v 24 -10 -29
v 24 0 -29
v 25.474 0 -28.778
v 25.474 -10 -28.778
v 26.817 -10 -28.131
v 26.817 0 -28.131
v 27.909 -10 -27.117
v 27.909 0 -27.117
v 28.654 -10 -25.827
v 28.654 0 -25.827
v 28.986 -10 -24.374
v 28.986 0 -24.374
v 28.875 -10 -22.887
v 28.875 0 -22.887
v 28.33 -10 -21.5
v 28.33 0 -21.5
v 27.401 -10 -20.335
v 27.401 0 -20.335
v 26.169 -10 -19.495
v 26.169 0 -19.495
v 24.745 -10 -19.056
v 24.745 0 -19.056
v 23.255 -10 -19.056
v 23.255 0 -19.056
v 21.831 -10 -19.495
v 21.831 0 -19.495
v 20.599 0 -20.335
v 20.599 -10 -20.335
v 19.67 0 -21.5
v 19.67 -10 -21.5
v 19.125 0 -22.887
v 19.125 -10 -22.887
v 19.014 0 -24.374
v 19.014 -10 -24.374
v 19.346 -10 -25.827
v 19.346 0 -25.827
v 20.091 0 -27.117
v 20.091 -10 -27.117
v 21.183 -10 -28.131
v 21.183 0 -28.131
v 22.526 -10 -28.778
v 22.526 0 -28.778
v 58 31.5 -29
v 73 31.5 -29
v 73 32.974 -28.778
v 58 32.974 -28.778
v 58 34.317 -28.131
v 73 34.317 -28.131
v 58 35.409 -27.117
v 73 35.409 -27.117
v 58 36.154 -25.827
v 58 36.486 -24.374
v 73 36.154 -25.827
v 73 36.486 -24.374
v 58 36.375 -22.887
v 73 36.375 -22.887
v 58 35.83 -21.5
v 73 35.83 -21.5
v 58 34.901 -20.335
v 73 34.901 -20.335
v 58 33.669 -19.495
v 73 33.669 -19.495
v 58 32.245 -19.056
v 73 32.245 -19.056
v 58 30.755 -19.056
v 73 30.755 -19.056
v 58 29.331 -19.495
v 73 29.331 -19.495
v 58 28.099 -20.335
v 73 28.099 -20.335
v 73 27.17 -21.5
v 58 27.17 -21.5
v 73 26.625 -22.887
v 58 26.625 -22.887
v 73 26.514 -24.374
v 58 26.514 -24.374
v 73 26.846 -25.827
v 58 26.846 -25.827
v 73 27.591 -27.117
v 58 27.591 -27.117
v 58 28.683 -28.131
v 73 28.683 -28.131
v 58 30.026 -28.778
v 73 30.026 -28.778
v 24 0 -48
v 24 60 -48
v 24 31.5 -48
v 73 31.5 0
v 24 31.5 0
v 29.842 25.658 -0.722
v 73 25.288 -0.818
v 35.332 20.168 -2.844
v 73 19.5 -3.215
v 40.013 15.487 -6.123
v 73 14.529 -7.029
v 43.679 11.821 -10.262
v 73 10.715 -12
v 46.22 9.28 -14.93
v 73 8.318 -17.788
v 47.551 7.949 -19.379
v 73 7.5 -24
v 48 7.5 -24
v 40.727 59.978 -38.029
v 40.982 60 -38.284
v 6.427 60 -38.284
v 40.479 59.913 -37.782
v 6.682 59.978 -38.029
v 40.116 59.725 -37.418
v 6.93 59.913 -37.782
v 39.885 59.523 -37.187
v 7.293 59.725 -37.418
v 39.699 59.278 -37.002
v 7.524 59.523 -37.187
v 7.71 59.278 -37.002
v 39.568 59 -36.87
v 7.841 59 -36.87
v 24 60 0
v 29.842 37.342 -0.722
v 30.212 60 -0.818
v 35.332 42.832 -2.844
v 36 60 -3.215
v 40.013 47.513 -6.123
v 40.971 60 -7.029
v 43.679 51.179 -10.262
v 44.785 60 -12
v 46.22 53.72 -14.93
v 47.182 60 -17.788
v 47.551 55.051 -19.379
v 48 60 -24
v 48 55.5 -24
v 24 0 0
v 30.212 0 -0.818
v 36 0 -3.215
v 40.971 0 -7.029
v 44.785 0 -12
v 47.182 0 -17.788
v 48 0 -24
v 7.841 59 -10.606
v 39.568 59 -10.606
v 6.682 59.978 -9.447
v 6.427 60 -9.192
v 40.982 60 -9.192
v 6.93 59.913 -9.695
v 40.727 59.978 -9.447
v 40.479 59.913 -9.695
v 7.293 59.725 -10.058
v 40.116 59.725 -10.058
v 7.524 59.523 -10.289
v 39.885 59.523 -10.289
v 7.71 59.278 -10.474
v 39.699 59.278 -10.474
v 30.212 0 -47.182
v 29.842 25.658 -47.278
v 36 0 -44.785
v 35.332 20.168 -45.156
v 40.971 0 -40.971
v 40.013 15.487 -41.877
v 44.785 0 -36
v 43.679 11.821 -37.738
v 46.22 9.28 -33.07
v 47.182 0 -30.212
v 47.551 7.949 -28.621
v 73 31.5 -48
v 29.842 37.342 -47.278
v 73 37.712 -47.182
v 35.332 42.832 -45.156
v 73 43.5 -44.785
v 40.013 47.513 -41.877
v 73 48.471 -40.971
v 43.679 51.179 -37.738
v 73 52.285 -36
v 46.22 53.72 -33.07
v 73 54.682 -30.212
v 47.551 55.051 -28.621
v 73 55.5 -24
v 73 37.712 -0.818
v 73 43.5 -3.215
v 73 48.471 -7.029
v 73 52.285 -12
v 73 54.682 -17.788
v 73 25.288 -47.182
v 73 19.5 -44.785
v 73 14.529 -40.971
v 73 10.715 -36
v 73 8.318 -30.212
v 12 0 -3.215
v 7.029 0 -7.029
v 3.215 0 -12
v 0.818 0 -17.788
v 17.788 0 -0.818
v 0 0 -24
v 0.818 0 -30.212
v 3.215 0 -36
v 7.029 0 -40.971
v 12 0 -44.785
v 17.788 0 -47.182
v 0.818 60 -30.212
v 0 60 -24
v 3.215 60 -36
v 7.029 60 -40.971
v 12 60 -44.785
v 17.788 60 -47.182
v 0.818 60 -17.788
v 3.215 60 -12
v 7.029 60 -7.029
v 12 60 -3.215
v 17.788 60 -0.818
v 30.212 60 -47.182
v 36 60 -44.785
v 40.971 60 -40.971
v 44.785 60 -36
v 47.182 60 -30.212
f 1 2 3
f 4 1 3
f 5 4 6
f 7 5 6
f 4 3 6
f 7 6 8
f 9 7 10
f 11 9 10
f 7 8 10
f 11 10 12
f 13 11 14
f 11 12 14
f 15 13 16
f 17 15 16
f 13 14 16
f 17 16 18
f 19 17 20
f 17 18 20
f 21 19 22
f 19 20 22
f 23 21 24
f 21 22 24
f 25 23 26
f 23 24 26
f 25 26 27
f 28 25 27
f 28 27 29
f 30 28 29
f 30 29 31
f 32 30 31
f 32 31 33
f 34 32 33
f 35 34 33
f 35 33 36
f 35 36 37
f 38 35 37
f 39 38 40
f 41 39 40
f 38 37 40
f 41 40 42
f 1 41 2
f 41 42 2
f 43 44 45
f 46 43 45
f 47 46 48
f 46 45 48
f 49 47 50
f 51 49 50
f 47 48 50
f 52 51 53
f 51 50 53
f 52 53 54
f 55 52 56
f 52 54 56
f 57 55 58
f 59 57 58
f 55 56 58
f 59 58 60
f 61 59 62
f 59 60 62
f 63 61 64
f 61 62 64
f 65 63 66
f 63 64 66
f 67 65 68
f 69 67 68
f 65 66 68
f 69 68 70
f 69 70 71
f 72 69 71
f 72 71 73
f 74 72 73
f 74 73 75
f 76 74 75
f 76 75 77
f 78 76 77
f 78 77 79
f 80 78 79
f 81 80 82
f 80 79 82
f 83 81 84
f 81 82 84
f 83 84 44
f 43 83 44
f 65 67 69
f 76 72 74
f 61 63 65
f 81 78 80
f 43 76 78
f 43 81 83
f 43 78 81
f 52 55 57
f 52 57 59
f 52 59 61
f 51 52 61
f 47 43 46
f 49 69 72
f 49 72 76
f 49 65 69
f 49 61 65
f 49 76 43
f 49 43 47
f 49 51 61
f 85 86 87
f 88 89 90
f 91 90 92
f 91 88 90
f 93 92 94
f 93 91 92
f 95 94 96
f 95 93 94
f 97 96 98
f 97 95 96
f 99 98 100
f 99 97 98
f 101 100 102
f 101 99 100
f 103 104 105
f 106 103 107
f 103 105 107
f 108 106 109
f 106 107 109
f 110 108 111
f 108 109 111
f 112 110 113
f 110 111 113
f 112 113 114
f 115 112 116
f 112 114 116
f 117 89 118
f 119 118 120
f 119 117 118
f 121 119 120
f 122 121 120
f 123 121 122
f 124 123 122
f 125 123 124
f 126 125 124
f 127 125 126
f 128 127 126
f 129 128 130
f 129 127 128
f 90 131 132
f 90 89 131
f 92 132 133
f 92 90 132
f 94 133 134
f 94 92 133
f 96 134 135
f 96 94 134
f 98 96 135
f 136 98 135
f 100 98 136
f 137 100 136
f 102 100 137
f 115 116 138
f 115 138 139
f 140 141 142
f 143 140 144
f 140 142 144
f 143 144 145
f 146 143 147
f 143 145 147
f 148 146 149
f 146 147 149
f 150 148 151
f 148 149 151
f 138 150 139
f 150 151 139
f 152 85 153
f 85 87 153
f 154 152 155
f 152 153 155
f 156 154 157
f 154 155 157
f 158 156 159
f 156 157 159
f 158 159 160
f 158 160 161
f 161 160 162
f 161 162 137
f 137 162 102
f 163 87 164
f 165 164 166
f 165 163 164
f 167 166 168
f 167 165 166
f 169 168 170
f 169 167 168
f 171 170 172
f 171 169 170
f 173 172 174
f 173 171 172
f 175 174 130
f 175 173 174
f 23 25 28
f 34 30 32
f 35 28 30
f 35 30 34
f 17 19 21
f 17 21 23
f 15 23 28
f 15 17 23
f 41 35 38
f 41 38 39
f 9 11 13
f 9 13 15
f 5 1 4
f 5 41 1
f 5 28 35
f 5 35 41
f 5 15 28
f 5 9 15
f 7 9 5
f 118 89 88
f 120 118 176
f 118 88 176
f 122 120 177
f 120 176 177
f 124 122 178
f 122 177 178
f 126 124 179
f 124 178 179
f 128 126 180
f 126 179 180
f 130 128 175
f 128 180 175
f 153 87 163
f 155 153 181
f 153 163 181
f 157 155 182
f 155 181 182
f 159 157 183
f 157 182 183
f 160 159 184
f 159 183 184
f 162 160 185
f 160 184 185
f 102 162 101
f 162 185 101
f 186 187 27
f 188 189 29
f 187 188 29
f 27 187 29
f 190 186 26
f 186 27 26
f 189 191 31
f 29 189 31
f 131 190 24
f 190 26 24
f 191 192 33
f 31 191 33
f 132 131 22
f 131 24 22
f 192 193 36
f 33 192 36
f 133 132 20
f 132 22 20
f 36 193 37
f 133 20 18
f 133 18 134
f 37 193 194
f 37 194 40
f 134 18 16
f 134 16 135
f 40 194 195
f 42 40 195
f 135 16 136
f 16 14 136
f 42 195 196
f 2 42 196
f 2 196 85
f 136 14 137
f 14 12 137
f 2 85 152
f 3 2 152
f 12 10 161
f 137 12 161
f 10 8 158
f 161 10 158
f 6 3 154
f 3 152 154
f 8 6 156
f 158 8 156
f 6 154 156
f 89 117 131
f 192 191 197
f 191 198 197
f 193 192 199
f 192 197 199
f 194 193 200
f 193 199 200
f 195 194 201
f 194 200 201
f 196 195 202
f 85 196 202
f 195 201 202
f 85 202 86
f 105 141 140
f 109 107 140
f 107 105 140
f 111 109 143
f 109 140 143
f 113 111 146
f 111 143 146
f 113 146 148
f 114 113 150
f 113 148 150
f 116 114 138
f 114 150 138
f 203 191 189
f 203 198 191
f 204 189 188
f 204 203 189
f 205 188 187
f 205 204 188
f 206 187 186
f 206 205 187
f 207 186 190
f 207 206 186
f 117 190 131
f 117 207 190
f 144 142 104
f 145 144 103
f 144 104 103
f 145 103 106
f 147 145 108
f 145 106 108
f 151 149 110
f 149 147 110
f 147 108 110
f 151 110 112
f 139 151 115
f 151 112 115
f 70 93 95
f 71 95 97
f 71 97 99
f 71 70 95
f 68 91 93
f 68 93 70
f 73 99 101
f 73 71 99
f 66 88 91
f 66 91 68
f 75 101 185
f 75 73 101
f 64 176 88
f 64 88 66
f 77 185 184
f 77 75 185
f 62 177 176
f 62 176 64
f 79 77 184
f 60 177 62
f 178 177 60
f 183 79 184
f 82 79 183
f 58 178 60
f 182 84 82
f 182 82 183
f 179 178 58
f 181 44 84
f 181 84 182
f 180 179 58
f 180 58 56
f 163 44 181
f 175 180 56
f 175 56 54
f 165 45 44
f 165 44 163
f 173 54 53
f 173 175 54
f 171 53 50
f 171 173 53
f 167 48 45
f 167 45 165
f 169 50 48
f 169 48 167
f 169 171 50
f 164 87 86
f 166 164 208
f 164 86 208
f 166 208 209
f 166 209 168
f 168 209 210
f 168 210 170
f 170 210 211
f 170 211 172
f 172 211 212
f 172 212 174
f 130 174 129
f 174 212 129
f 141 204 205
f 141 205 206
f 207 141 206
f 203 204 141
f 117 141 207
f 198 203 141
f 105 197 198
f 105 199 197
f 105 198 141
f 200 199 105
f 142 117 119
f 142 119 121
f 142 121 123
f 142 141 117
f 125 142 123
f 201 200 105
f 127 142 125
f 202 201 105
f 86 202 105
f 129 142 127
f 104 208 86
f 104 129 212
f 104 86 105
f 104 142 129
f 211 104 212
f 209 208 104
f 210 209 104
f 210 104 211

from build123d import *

# Parameters (mm, degrees)
SKETCH1_W           = 48
SKETCH1_H           = 48
BOSS_EXTRUDE1_DEPTH = 60
SKETCH2_W           = 48
SKETCH2_H           = 48
BOSS_EXTRUDE2_DEPTH = 25
FILLET1_R           = 24
SKETCH3_R           = 5
BOSS_EXTRUDE3_DEPTH = 10
SKETCH4_R           = 5
CUT_EXTRUDE1_DEPTH  = 15
SKETCH5_W           = 31.72674495
SKETCH5_H           = 26.264357258
CUT_EXTRUDE2_DEPTH  = 2
SKETCH8_W           = 31.72674495
SKETCH8_H           = 26.264357258
BOSS_EXTRUDE6_DEPTH = 1
FILLET3_R           = 1.5


# Some blends are built 0.0001 mm under size
with BuildPart() as part:
    # Sketch1 → Boss-Extrude1 (new body)
    with BuildSketch(Plane(origin=(0, 0, 0), x_dir=(1, 0, 0), z_dir=(0, 1, 0))):
        with Locations((24, 24)):
            Rectangle(SKETCH1_W, SKETCH1_H)
    extrude(amount=BOSS_EXTRUDE1_DEPTH)

    # Sketch2 → Boss-Extrude2 (add)
    with BuildSketch(Plane(origin=(48, 0, 0), x_dir=(0, 0, -1), z_dir=(1, 0, 0))):
        with Locations((24, 31.5)):
            Rectangle(SKETCH2_W, SKETCH2_H)
    extrude(amount=BOSS_EXTRUDE2_DEPTH)

    # Fillet1
    fillet1_edges = [part.edges().sort_by_distance(p)[0] for p in [
        (0, 30, 0),
        (0, 30, -48),
        (48, 57.75, -48),
        (48, 57.75, 0),
        (48, 3.75, -48),
        (48, 3.75, 0),
        (60.5, 7.5, 0),
        (60.5, 55.5, 0),
        (60.5, 7.5, -48),
        (60.5, 55.5, -48),
    ]]
    fillet(fillet1_edges, radius=FILLET1_R - 0.0001)  # a hair under: the kernel refuses the full size

    # Sketch3 → Boss-Extrude3 (add)
    with BuildSketch(Plane(origin=(0, 0, 0), x_dir=(-1, 0, 0), z_dir=(0, -1, 0))):
        with Locations(Location((-24, 24, 0), (0, 0, 90))):
            Circle(SKETCH3_R)
    extrude(amount=BOSS_EXTRUDE3_DEPTH)

    # Sketch4 → Cut-Extrude1 (cut)
    with BuildSketch(Plane(origin=(73, 0, 0), x_dir=(0, 0, -1), z_dir=(1, 0, 0))):
        with Locations((24, 31.5)):
            Circle(SKETCH4_R)
    extrude(amount=-CUT_EXTRUDE1_DEPTH, mode=Mode.SUBTRACT)

    # Sketch5 → Cut-Extrude2 (cut)
    with BuildSketch(Plane(origin=(0, 60, 0), x_dir=(1, 0, 0), z_dir=(0, 1, 0))):
        with Locations((23.7045439, 23.7381047)):
            Rectangle(SKETCH5_W, SKETCH5_H)
    extrude(amount=-CUT_EXTRUDE2_DEPTH, mode=Mode.SUBTRACT)

    # Sketch8 → Boss-Extrude6 (add)
    with BuildSketch(Plane(origin=(0, 58, 0), x_dir=(1, 0, 0), z_dir=(0, 1, 0))):
        with Locations((23.7045439, 23.7381047)):
            Rectangle(SKETCH8_W, SKETCH8_H)
    extrude(amount=BOSS_EXTRUDE6_DEPTH)

    # Fillet3
    # the kernel refuses this fillet: 1.5 mm, written as the material it takes off along each edge
    with BuildSketch(Plane(origin=(39.567916375, 60, -10.605926071), x_dir=(0, 0, 1), z_dir=(-1, 0, 0)), Plane(origin=(7.841171425, 60, -36.870283329), x_dir=(0, 0, -1), z_dir=(1, 0, 0))) as fillet3_piece_1:
        with BuildLine():
            CenterArc((1.414213562, -1.5), FILLET3_R, 90, 70.528779366)
            Line((0, -1), (-0.028284271, -0.99))
            ThreePointArc((-0.028284271, -0.99), (-0.03, -0.5), (-0.03, 0))
            Line((-0.03, 0), (0, 0.03))
            Line((0, 0.03), (1.414213562, 0.03))
            Line((1.414213562, 0.03), (1.414213562, 0))
        make_face()
    extrude(amount=31.72674495, mode=Mode.SUBTRACT)
    with BuildSketch(Plane(origin=(39.567916375, 60, -36.870283329), x_dir=(1, 0, 0), z_dir=(0, 0, 1)), Plane(origin=(7.841171425, 60, -10.605926071), x_dir=(-1, 0, 0), z_dir=(0, 0, -1))) as fillet3_piece_2:
        with BuildLine():
            CenterArc((1.414213562, -1.5), FILLET3_R, 90, 70.528779366)
            Line((0, -1), (-0.028284271, -0.99))
            ThreePointArc((-0.028284271, -0.99), (-0.03, -0.5), (-0.03, 0))
            Line((-0.03, 0), (0, 0.03))
            Line((0, 0.03), (1.414213562, 0.03))
            Line((1.414213562, 0.03), (1.414213562, 0))
        make_face()
    extrude(amount=26.264357258, mode=Mode.SUBTRACT)
    with BuildSketch(Plane(origin=(43.103450281, 60, -10.605926071), x_dir=(0, 0, 1), z_dir=(-1, 0, 0))) as fillet3_piece_3a_section:
        with BuildLine():
            CenterArc((1.414213562, -1.5), FILLET3_R, 90, 70.528779366)
            Line((0, -1), (-0.028284271, -0.99))
            ThreePointArc((-0.028284271, -0.99), (-0.03, -0.5), (-0.03, 0))
            Line((-0.03, 0), (0, 0.03))
            Line((0, 0.03), (1.414213562, 0.03))
            Line((1.414213562, 0.03), (1.414213562, 0))
        make_face()
    fillet3_piece_3a = extrude(amount=35.262278856, mode=Mode.PRIVATE)
    fillet3_piece_3a = split(fillet3_piece_3a, bisect_by=Plane(origin=(39.567916375, 59.743234105, -10.266766855), z_dir=(1, 0, 0)), keep=Keep.TOP, mode=Mode.PRIVATE)
    with BuildSketch(Plane(origin=(39.567916375, 60, -36.870283329), x_dir=(1, 0, 0), z_dir=(0, 0, 1))) as fillet3_piece_3b_section:
        with BuildLine():
            CenterArc((1.414213562, -1.5), FILLET3_R, 90, 70.528779366)
            Line((0, -1), (-0.028284271, -0.99))
            ThreePointArc((-0.028284271, -0.99), (-0.03, -0.5), (-0.03, 0))
            Line((-0.03, 0), (0, 0.03))
            Line((0, 0.03), (1.414213562, 0.03))
            Line((1.414213562, 0.03), (1.414213562, 0))
        make_face()
    fillet3_piece_3b = extrude(amount=29.799891164, mode=Mode.PRIVATE)
    fillet3_piece_3b = split(fillet3_piece_3b, bisect_by=Plane(origin=(39.90707559, 59.743234105, -10.605926071), z_dir=(0, 0, 1)), keep=Keep.TOP, mode=Mode.PRIVATE)
    fillet3_piece_3 = fillet3_piece_3a & fillet3_piece_3b
    add(fillet3_piece_3, mode=Mode.SUBTRACT)
    with BuildSketch(Plane(origin=(7.841171425, 60, -7.070392165), x_dir=(-1, 0, 0), z_dir=(0, 0, -1))) as fillet3_piece_4a_section:
        with BuildLine():
            CenterArc((1.414213562, -1.5), FILLET3_R, 90, 70.528779366)
            Line((0, -1), (-0.028284271, -0.99))
            ThreePointArc((-0.028284271, -0.99), (-0.03, -0.5), (-0.03, 0))
            Line((-0.03, 0), (0, 0.03))
            Line((0, 0.03), (1.414213562, 0.03))
            Line((1.414213562, 0.03), (1.414213562, 0))
        make_face()
    fillet3_piece_4a = extrude(amount=29.799891164, mode=Mode.PRIVATE)
    fillet3_piece_4a = split(fillet3_piece_4a, bisect_by=Plane(origin=(7.50201221, 59.743234105, -10.605926071), z_dir=(0, 0, 1)), keep=Keep.TOP, mode=Mode.PRIVATE)
    with BuildSketch(Plane(origin=(39.567916375, 60, -10.605926071), x_dir=(0, 0, 1), z_dir=(-1, 0, 0))) as fillet3_piece_4b_section:
        with BuildLine():
            CenterArc((1.414213562, -1.5), FILLET3_R, 90, 70.528779366)
            Line((0, -1), (-0.028284271, -0.99))
            ThreePointArc((-0.028284271, -0.99), (-0.03, -0.5), (-0.03, 0))
            Line((-0.03, 0), (0, 0.03))
            Line((0, 0.03), (1.414213562, 0.03))
            Line((1.414213562, 0.03), (1.414213562, 0))
        make_face()
    fillet3_piece_4b = extrude(amount=35.262278856, mode=Mode.PRIVATE)
    fillet3_piece_4b = split(fillet3_piece_4b, bisect_by=Plane(origin=(7.841171425, 59.743234105, -10.266766855), z_dir=(-1, 0, 0)), keep=Keep.TOP, mode=Mode.PRIVATE)
    fillet3_piece_4 = fillet3_piece_4a & fillet3_piece_4b
    add(fillet3_piece_4, mode=Mode.SUBTRACT)
    with BuildSketch(Plane(origin=(39.567916375, 60, -40.405817235), x_dir=(1, 0, 0), z_dir=(0, 0, 1))) as fillet3_piece_5a_section:
        with BuildLine():
            CenterArc((1.414213562, -1.5), FILLET3_R, 90, 70.528779366)
            Line((0, -1), (-0.028284271, -0.99))
            ThreePointArc((-0.028284271, -0.99), (-0.03, -0.5), (-0.03, 0))
            Line((-0.03, 0), (0, 0.03))
            Line((0, 0.03), (1.414213562, 0.03))
            Line((1.414213562, 0.03), (1.414213562, 0))
        make_face()
    fillet3_piece_5a = extrude(amount=29.799891164, mode=Mode.PRIVATE)
    fillet3_piece_5a = split(fillet3_piece_5a, bisect_by=Plane(origin=(39.90707559, 59.743234105, -36.870283329), z_dir=(0, 0, -1)), keep=Keep.TOP, mode=Mode.PRIVATE)
    with BuildSketch(Plane(origin=(7.841171425, 60, -36.870283329), x_dir=(0, 0, -1), z_dir=(1, 0, 0))) as fillet3_piece_5b_section:
        with BuildLine():
            CenterArc((1.414213562, -1.5), FILLET3_R, 90, 70.528779366)
            Line((0, -1), (-0.028284271, -0.99))
            ThreePointArc((-0.028284271, -0.99), (-0.03, -0.5), (-0.03, 0))
            Line((-0.03, 0), (0, 0.03))
            Line((0, 0.03), (1.414213562, 0.03))
            Line((1.414213562, 0.03), (1.414213562, 0))
        make_face()
    fillet3_piece_5b = extrude(amount=35.262278856, mode=Mode.PRIVATE)
    fillet3_piece_5b = split(fillet3_piece_5b, bisect_by=Plane(origin=(39.567916375, 59.743234105, -37.209442544), z_dir=(1, 0, 0)), keep=Keep.TOP, mode=Mode.PRIVATE)
    fillet3_piece_5 = fillet3_piece_5a & fillet3_piece_5b
    add(fillet3_piece_5, mode=Mode.SUBTRACT)
    with BuildSketch(Plane(origin=(7.841171425, 60, -10.605926071), x_dir=(-1, 0, 0), z_dir=(0, 0, -1))) as fillet3_piece_6a_section:
        with BuildLine():
            CenterArc((1.414213562, -1.5), FILLET3_R, 90, 70.528779366)
            Line((0, -1), (-0.028284271, -0.99))
            ThreePointArc((-0.028284271, -0.99), (-0.03, -0.5), (-0.03, 0))
            Line((-0.03, 0), (0, 0.03))
            Line((0, 0.03), (1.414213562, 0.03))
            Line((1.414213562, 0.03), (1.414213562, 0))
        make_face()
    fillet3_piece_6a = extrude(amount=29.799891164, mode=Mode.PRIVATE)
    fillet3_piece_6a = split(fillet3_piece_6a, bisect_by=Plane(origin=(7.50201221, 59.743234105, -36.870283329), z_dir=(0, 0, -1)), keep=Keep.TOP, mode=Mode.PRIVATE)
    with BuildSketch(Plane(origin=(4.305637519, 60, -36.870283329), x_dir=(0, 0, -1), z_dir=(1, 0, 0))) as fillet3_piece_6b_section:
        with BuildLine():
            CenterArc((1.414213562, -1.5), FILLET3_R, 90, 70.528779366)
            Line((0, -1), (-0.028284271, -0.99))
            ThreePointArc((-0.028284271, -0.99), (-0.03, -0.5), (-0.03, 0))
            Line((-0.03, 0), (0, 0.03))
            Line((0, 0.03), (1.414213562, 0.03))
            Line((1.414213562, 0.03), (1.414213562, 0))
        make_face()
    fillet3_piece_6b = extrude(amount=35.262278856, mode=Mode.PRIVATE)
    fillet3_piece_6b = split(fillet3_piece_6b, bisect_by=Plane(origin=(7.841171425, 59.743234105, -37.209442544), z_dir=(-1, 0, 0)), keep=Keep.TOP, mode=Mode.PRIVATE)
    fillet3_piece_6 = fillet3_piece_6a & fillet3_piece_6b
    add(fillet3_piece_6, mode=Mode.SUBTRACT)


solid = part.part
